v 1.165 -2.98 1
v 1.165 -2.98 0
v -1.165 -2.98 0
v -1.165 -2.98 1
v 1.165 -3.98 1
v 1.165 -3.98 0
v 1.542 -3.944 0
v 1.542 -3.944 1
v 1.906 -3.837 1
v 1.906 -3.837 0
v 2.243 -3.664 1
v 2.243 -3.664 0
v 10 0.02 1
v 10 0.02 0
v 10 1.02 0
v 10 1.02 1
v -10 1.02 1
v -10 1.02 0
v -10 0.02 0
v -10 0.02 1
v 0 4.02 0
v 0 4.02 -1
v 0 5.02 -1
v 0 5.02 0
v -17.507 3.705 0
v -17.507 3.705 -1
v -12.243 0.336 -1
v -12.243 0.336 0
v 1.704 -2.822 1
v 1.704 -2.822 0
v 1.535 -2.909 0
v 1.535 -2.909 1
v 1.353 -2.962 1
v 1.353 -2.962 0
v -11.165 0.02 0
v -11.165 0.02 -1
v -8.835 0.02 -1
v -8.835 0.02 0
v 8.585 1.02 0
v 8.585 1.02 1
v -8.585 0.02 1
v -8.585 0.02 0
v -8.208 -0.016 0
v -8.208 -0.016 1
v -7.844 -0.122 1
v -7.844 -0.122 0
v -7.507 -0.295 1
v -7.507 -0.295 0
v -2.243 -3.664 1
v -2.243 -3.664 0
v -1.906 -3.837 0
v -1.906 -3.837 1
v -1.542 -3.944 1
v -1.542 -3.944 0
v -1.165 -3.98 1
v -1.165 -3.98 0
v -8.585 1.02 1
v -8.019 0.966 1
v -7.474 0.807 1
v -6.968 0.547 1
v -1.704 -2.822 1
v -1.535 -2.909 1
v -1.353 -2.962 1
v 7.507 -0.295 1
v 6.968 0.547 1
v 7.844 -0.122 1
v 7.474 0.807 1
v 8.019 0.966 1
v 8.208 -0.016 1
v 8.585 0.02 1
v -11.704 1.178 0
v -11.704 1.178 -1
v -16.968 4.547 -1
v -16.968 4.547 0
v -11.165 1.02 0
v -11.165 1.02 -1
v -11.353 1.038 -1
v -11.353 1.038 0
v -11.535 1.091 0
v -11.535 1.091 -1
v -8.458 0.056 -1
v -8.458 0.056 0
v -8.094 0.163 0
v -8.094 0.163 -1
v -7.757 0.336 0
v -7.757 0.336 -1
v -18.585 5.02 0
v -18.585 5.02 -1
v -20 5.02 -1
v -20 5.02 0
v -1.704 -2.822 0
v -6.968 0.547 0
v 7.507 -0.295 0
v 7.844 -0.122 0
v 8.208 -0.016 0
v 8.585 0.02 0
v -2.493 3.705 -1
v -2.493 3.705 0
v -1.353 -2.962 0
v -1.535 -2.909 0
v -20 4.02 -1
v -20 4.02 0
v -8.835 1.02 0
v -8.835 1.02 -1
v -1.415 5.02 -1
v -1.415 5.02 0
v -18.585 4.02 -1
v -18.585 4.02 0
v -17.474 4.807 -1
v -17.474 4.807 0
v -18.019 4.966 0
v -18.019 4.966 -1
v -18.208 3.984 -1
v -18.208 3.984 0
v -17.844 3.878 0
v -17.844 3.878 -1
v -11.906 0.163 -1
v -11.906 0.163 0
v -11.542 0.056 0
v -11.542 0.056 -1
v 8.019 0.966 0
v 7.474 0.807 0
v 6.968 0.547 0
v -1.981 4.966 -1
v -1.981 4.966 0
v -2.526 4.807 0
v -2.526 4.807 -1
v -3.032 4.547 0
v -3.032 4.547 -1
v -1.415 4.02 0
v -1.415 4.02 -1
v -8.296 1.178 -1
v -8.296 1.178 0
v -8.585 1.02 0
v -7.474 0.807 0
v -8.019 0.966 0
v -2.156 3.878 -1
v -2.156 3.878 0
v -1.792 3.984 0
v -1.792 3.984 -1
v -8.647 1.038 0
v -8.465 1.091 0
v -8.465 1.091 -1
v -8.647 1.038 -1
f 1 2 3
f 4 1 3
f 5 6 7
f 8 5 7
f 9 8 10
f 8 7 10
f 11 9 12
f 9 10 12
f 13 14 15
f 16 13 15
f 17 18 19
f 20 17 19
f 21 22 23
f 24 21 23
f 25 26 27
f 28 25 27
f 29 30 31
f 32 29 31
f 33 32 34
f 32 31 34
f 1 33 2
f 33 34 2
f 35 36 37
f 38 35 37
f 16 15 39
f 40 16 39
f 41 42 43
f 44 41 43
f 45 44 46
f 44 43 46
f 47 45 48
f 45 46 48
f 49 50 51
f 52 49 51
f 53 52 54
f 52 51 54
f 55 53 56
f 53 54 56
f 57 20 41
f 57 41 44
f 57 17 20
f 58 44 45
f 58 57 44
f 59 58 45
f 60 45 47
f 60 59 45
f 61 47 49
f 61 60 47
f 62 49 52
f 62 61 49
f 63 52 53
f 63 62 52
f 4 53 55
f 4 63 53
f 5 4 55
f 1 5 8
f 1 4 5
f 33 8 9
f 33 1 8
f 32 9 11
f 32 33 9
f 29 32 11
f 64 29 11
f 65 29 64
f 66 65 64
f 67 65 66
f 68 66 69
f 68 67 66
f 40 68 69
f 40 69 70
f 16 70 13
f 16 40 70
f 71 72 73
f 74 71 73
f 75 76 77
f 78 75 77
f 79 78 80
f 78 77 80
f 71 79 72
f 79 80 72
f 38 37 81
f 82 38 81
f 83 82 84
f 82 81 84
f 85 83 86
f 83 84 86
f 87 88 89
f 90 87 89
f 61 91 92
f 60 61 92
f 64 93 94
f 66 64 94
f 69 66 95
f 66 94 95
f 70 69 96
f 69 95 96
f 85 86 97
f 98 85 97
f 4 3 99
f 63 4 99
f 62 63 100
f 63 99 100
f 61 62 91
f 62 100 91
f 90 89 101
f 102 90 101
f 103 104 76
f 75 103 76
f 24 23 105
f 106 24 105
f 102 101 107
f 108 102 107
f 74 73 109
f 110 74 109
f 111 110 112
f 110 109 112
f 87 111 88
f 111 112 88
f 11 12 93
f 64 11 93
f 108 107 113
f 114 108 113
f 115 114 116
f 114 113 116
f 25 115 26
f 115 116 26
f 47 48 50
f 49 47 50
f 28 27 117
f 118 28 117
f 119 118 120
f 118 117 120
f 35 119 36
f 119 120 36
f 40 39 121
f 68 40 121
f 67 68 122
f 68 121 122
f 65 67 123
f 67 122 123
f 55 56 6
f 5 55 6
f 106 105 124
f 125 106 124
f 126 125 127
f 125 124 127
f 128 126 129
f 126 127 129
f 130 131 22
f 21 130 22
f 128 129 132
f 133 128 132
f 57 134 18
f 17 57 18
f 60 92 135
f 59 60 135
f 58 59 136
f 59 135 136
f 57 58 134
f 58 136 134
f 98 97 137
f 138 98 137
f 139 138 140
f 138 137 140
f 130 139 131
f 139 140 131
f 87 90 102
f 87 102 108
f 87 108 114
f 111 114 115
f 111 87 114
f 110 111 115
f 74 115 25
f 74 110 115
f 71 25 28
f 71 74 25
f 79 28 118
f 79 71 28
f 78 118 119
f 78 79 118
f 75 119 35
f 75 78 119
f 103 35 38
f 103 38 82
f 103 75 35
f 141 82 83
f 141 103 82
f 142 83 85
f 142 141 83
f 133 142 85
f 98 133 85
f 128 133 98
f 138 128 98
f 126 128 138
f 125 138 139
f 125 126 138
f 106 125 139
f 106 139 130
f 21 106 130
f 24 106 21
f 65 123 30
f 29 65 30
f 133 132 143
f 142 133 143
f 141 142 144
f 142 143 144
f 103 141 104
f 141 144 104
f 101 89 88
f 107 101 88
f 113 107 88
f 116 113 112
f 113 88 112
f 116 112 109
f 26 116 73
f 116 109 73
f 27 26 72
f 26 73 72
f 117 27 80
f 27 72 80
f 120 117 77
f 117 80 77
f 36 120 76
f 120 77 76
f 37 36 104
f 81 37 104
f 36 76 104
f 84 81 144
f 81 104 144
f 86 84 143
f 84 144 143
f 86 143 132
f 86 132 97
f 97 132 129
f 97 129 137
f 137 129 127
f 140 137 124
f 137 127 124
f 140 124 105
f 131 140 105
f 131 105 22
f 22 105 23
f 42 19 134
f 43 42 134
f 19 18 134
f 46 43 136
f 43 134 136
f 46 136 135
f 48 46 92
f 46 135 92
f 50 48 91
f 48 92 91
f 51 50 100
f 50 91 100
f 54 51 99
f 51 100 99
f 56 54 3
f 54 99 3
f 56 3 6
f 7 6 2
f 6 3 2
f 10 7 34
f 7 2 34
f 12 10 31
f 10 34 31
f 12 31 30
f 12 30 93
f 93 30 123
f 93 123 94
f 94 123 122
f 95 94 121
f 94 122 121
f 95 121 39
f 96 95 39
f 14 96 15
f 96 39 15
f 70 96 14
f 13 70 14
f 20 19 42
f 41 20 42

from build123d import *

# Parameters (mm, degrees)
EXTRUDE_THIN2_DEPTH   = 1
SKETCH_PATTERN3_DEPTH = 1


# Read off the part's stored shape, not the designer's step: Sketch-Pattern3
with BuildPart() as part:
    # Sketch1 → Extrude-Thin2 (new body)
    with BuildSketch(Plane.XY):
        with BuildLine():
            Line((-10, 0.02027027), (-8.58520552, 0.02027027))
            ThreePointArc((-8.58520552, 0.02027027), (-8.023549755, -0.060213436), (-7.507098127, -0.295186928))
            Line((-7.507098127, -0.295186928), (-2.242901873, -3.664272531))
            ThreePointArc((-2.242901873, -3.664272531), (-1.726450245, -3.899246023), (-1.16479448, -3.97972973))
            Line((-1.16479448, -3.97972973), (1.16479448, -3.97972973))
            ThreePointArc((1.16479448, -3.97972973), (1.726450245, -3.899246023), (2.242901873, -3.664272531))
            Line((2.242901873, -3.664272531), (7.507098127, -0.295186928))
            ThreePointArc((7.507098127, -0.295186928), (8.023549755, -0.060213436), (8.58520552, 0.02027027))
            Line((8.58520552, 0.02027027), (10, 0.02027027))
            Line((10, 0.02027027), (10, 1.02027027))
            Line((10, 1.02027027), (8.58520552, 1.02027027))
            ThreePointArc((8.58520552, 1.02027027), (7.742721872, 0.899544711), (6.968044431, 0.547084472))
            Line((6.968044431, 0.547084472), (1.703848177, -2.82200113))
            ThreePointArc((1.703848177, -2.82200113), (1.445622363, -2.939487877), (1.16479448, -2.97972973))
            Line((1.16479448, -2.97972973), (-1.16479448, -2.97972973))
            ThreePointArc((-1.16479448, -2.97972973), (-1.445622363, -2.939487877), (-1.703848177, -2.82200113))
            Line((-1.703848177, -2.82200113), (-6.968044431, 0.547084472))
            ThreePointArc((-6.968044431, 0.547084472), (-7.742721872, 0.899544711), (-8.58520552, 1.02027027))
            Line((-8.58520552, 1.02027027), (-10, 1.02027027))
            Line((-10, 1.02027027), (-10, 0.02027027))
        make_face()
    extrude(amount=EXTRUDE_THIN2_DEPTH)


with BuildPart() as body_2:
    # Sketch-Pattern3 outline → Sketch-Pattern3 (new body)
    with BuildSketch(Plane.XY):
        with BuildLine():
            Line((-8.83520552, 1.02027027), (-11.16479448, 1.02027027))
            ThreePointArc((-11.16479448, 1.02027027), (-11.445622363, 1.060512123), (-11.703848177, 1.17799887))
            Line((-11.703848177, 1.17799887), (-16.968044431, 4.547084472))
            ThreePointArc((-16.968044431, 4.547084472), (-17.742721872, 4.899544711), (-18.58520552, 5.02027027))
            Line((-18.58520552, 5.02027027), (-20, 5.02027027))
            Line((-20, 5.02027027), (-20, 4.02027027))
            Line((-20, 4.02027027), (-18.58520552, 4.02027027))
            ThreePointArc((-18.58520552, 4.02027027), (-18.023549755, 3.939786564), (-17.507098127, 3.704813072))
            Line((-17.507098127, 3.704813072), (-12.242901873, 0.335727469))
            ThreePointArc((-12.242901873, 0.335727469), (-11.726450245, 0.100753977), (-11.16479448, 0.02027027))
            Line((-11.16479448, 0.02027027), (-8.83520552, 0.02027027))
            ThreePointArc((-8.83520552, 0.02027027), (-8.273549755, 0.100753977), (-7.757098127, 0.335727469))
            Line((-7.757098127, 0.335727469), (-2.492901873, 3.704813072))
            ThreePointArc((-2.492901873, 3.704813072), (-1.976450245, 3.939786564), (-1.41479448, 4.02027027))
            Line((-1.41479448, 4.02027027), (0, 4.02027027))
            Line((0, 4.02027027), (0, 5.02027027))
            Line((0, 5.02027027), (-1.41479448, 5.02027027))
            ThreePointArc((-1.41479448, 5.02027027), (-2.257278128, 4.899544711), (-3.031955569, 4.547084472))
            Line((-3.031955569, 4.547084472), (-8.296151823, 1.17799887))
            ThreePointArc((-8.296151823, 1.17799887), (-8.554377637, 1.060512123), (-8.83520552, 1.02027027))
        make_face()
    extrude(amount=SKETCH_PATTERN3_DEPTH)


with BuildPart() as body_2_1:
    # Body-Move/Copy1: moved
    add(body_2.part.moved(Location((0, 0, -1))))


solid = Compound([part.part, body_2_1.part])
